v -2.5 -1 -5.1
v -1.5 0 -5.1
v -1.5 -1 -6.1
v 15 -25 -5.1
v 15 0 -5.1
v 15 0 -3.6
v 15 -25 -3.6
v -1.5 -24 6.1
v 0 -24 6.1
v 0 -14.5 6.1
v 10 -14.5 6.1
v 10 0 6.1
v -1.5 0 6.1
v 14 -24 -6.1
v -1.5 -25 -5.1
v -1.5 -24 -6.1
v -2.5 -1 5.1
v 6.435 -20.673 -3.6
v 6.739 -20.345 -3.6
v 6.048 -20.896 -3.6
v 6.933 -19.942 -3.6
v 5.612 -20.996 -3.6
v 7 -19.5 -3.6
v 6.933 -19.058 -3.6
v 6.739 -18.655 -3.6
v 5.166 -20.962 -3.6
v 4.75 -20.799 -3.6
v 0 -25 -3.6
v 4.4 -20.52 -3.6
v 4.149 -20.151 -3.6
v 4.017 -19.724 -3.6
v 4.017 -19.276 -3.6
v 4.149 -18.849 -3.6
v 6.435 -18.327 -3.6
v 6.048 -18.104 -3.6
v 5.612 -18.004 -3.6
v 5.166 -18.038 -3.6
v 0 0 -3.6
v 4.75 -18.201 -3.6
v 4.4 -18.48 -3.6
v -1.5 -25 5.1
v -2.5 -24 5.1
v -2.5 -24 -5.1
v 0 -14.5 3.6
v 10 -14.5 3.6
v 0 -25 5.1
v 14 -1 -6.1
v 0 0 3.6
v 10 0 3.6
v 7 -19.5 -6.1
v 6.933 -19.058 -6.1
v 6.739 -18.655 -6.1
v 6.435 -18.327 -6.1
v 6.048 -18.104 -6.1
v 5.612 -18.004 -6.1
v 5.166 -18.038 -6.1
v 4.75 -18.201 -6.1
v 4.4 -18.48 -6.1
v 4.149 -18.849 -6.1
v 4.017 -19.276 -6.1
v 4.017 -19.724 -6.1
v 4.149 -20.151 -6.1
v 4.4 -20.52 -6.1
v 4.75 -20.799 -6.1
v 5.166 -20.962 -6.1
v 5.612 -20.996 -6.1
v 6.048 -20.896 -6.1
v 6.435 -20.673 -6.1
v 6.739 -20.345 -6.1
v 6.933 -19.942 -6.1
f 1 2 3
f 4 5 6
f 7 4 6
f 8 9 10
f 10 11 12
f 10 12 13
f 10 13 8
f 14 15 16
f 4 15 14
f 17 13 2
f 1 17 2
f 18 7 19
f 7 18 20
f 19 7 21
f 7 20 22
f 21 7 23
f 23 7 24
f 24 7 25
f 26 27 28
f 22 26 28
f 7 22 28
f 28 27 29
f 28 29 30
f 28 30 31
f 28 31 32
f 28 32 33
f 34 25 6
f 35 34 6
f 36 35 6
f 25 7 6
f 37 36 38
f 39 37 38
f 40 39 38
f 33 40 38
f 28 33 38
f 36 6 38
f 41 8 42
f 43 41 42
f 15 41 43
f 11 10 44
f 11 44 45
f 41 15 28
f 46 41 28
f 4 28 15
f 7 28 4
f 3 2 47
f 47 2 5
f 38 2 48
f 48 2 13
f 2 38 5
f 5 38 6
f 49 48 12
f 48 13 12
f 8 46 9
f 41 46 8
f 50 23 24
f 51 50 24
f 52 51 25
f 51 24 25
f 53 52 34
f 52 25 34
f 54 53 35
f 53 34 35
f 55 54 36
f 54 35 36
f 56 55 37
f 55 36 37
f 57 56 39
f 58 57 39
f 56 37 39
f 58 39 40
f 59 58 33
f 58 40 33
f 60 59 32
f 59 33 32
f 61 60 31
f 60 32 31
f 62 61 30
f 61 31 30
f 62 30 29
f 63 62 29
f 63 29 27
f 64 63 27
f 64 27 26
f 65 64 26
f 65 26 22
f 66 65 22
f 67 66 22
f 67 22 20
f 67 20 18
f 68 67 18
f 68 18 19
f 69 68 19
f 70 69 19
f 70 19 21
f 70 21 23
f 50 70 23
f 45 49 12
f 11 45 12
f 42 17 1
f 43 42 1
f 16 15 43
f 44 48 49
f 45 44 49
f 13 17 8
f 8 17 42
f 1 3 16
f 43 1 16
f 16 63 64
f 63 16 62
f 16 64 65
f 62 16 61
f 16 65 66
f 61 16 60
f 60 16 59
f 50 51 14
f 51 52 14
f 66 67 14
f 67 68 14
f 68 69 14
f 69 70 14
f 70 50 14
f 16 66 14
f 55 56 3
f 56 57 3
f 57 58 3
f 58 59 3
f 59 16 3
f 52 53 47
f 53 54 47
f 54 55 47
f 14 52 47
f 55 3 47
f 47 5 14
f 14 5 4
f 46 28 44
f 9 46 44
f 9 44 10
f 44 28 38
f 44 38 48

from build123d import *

# Parameters (mm, degrees)
F1_DEPTH = 25
F2_R     = 1.5
F3_DEPTH = 25
F4_W     = 10
F4_H     = 10.5
F4_R     = 1.5
F5_DEPTH = 5
F6_SIZE  = 1


with BuildPart() as f1:
    # F0 (on Front) → F1 (new body)
    with BuildSketch(Plane.XZ):
        Polygon((0, -3.6), (0, 3.6), (10, 3.6), (10, 6.1), (-2.5, 6.1), (-2.5, -6.1), (15, -6.1), (15, -3.6), align=None)
    extrude(amount=F1_DEPTH)

    # F2 (on face) → F3 (cut)
    with BuildSketch(Plane.XY.offset(6.1)):
        with Locations((5.5, -19.5)):
            Circle(F2_R)
    extrude(amount=-F3_DEPTH, mode=Mode.SUBTRACT)

    # F4 (on face) → F5 (cut)
    with BuildSketch(Plane.XY.offset(6.1)):
        with Locations((5, -19.75)):
            Rectangle(F4_W, F4_H)
        with Locations((5.5, -19.5)):
            Circle(F4_R, mode=Mode.SUBTRACT)
    extrude(amount=-F5_DEPTH, mode=Mode.SUBTRACT)

    # F6
    f6_edges = [f1.edges().sort_by_distance(p)[0] for p in [
        (15, -12.5, -6.1),
        (6.25, 0, -6.1),
        (6.25, -25, -6.1),
        (-2.5, -12.5, 6.1),
        (-1.25, -25, 6.1),
        (-2.5, -25, 0),
        (-2.5, 0, 0),
        (-2.5, -12.5, -6.1),
    ]]
    chamfer(f6_edges, length=F6_SIZE)


solid = f1.part
